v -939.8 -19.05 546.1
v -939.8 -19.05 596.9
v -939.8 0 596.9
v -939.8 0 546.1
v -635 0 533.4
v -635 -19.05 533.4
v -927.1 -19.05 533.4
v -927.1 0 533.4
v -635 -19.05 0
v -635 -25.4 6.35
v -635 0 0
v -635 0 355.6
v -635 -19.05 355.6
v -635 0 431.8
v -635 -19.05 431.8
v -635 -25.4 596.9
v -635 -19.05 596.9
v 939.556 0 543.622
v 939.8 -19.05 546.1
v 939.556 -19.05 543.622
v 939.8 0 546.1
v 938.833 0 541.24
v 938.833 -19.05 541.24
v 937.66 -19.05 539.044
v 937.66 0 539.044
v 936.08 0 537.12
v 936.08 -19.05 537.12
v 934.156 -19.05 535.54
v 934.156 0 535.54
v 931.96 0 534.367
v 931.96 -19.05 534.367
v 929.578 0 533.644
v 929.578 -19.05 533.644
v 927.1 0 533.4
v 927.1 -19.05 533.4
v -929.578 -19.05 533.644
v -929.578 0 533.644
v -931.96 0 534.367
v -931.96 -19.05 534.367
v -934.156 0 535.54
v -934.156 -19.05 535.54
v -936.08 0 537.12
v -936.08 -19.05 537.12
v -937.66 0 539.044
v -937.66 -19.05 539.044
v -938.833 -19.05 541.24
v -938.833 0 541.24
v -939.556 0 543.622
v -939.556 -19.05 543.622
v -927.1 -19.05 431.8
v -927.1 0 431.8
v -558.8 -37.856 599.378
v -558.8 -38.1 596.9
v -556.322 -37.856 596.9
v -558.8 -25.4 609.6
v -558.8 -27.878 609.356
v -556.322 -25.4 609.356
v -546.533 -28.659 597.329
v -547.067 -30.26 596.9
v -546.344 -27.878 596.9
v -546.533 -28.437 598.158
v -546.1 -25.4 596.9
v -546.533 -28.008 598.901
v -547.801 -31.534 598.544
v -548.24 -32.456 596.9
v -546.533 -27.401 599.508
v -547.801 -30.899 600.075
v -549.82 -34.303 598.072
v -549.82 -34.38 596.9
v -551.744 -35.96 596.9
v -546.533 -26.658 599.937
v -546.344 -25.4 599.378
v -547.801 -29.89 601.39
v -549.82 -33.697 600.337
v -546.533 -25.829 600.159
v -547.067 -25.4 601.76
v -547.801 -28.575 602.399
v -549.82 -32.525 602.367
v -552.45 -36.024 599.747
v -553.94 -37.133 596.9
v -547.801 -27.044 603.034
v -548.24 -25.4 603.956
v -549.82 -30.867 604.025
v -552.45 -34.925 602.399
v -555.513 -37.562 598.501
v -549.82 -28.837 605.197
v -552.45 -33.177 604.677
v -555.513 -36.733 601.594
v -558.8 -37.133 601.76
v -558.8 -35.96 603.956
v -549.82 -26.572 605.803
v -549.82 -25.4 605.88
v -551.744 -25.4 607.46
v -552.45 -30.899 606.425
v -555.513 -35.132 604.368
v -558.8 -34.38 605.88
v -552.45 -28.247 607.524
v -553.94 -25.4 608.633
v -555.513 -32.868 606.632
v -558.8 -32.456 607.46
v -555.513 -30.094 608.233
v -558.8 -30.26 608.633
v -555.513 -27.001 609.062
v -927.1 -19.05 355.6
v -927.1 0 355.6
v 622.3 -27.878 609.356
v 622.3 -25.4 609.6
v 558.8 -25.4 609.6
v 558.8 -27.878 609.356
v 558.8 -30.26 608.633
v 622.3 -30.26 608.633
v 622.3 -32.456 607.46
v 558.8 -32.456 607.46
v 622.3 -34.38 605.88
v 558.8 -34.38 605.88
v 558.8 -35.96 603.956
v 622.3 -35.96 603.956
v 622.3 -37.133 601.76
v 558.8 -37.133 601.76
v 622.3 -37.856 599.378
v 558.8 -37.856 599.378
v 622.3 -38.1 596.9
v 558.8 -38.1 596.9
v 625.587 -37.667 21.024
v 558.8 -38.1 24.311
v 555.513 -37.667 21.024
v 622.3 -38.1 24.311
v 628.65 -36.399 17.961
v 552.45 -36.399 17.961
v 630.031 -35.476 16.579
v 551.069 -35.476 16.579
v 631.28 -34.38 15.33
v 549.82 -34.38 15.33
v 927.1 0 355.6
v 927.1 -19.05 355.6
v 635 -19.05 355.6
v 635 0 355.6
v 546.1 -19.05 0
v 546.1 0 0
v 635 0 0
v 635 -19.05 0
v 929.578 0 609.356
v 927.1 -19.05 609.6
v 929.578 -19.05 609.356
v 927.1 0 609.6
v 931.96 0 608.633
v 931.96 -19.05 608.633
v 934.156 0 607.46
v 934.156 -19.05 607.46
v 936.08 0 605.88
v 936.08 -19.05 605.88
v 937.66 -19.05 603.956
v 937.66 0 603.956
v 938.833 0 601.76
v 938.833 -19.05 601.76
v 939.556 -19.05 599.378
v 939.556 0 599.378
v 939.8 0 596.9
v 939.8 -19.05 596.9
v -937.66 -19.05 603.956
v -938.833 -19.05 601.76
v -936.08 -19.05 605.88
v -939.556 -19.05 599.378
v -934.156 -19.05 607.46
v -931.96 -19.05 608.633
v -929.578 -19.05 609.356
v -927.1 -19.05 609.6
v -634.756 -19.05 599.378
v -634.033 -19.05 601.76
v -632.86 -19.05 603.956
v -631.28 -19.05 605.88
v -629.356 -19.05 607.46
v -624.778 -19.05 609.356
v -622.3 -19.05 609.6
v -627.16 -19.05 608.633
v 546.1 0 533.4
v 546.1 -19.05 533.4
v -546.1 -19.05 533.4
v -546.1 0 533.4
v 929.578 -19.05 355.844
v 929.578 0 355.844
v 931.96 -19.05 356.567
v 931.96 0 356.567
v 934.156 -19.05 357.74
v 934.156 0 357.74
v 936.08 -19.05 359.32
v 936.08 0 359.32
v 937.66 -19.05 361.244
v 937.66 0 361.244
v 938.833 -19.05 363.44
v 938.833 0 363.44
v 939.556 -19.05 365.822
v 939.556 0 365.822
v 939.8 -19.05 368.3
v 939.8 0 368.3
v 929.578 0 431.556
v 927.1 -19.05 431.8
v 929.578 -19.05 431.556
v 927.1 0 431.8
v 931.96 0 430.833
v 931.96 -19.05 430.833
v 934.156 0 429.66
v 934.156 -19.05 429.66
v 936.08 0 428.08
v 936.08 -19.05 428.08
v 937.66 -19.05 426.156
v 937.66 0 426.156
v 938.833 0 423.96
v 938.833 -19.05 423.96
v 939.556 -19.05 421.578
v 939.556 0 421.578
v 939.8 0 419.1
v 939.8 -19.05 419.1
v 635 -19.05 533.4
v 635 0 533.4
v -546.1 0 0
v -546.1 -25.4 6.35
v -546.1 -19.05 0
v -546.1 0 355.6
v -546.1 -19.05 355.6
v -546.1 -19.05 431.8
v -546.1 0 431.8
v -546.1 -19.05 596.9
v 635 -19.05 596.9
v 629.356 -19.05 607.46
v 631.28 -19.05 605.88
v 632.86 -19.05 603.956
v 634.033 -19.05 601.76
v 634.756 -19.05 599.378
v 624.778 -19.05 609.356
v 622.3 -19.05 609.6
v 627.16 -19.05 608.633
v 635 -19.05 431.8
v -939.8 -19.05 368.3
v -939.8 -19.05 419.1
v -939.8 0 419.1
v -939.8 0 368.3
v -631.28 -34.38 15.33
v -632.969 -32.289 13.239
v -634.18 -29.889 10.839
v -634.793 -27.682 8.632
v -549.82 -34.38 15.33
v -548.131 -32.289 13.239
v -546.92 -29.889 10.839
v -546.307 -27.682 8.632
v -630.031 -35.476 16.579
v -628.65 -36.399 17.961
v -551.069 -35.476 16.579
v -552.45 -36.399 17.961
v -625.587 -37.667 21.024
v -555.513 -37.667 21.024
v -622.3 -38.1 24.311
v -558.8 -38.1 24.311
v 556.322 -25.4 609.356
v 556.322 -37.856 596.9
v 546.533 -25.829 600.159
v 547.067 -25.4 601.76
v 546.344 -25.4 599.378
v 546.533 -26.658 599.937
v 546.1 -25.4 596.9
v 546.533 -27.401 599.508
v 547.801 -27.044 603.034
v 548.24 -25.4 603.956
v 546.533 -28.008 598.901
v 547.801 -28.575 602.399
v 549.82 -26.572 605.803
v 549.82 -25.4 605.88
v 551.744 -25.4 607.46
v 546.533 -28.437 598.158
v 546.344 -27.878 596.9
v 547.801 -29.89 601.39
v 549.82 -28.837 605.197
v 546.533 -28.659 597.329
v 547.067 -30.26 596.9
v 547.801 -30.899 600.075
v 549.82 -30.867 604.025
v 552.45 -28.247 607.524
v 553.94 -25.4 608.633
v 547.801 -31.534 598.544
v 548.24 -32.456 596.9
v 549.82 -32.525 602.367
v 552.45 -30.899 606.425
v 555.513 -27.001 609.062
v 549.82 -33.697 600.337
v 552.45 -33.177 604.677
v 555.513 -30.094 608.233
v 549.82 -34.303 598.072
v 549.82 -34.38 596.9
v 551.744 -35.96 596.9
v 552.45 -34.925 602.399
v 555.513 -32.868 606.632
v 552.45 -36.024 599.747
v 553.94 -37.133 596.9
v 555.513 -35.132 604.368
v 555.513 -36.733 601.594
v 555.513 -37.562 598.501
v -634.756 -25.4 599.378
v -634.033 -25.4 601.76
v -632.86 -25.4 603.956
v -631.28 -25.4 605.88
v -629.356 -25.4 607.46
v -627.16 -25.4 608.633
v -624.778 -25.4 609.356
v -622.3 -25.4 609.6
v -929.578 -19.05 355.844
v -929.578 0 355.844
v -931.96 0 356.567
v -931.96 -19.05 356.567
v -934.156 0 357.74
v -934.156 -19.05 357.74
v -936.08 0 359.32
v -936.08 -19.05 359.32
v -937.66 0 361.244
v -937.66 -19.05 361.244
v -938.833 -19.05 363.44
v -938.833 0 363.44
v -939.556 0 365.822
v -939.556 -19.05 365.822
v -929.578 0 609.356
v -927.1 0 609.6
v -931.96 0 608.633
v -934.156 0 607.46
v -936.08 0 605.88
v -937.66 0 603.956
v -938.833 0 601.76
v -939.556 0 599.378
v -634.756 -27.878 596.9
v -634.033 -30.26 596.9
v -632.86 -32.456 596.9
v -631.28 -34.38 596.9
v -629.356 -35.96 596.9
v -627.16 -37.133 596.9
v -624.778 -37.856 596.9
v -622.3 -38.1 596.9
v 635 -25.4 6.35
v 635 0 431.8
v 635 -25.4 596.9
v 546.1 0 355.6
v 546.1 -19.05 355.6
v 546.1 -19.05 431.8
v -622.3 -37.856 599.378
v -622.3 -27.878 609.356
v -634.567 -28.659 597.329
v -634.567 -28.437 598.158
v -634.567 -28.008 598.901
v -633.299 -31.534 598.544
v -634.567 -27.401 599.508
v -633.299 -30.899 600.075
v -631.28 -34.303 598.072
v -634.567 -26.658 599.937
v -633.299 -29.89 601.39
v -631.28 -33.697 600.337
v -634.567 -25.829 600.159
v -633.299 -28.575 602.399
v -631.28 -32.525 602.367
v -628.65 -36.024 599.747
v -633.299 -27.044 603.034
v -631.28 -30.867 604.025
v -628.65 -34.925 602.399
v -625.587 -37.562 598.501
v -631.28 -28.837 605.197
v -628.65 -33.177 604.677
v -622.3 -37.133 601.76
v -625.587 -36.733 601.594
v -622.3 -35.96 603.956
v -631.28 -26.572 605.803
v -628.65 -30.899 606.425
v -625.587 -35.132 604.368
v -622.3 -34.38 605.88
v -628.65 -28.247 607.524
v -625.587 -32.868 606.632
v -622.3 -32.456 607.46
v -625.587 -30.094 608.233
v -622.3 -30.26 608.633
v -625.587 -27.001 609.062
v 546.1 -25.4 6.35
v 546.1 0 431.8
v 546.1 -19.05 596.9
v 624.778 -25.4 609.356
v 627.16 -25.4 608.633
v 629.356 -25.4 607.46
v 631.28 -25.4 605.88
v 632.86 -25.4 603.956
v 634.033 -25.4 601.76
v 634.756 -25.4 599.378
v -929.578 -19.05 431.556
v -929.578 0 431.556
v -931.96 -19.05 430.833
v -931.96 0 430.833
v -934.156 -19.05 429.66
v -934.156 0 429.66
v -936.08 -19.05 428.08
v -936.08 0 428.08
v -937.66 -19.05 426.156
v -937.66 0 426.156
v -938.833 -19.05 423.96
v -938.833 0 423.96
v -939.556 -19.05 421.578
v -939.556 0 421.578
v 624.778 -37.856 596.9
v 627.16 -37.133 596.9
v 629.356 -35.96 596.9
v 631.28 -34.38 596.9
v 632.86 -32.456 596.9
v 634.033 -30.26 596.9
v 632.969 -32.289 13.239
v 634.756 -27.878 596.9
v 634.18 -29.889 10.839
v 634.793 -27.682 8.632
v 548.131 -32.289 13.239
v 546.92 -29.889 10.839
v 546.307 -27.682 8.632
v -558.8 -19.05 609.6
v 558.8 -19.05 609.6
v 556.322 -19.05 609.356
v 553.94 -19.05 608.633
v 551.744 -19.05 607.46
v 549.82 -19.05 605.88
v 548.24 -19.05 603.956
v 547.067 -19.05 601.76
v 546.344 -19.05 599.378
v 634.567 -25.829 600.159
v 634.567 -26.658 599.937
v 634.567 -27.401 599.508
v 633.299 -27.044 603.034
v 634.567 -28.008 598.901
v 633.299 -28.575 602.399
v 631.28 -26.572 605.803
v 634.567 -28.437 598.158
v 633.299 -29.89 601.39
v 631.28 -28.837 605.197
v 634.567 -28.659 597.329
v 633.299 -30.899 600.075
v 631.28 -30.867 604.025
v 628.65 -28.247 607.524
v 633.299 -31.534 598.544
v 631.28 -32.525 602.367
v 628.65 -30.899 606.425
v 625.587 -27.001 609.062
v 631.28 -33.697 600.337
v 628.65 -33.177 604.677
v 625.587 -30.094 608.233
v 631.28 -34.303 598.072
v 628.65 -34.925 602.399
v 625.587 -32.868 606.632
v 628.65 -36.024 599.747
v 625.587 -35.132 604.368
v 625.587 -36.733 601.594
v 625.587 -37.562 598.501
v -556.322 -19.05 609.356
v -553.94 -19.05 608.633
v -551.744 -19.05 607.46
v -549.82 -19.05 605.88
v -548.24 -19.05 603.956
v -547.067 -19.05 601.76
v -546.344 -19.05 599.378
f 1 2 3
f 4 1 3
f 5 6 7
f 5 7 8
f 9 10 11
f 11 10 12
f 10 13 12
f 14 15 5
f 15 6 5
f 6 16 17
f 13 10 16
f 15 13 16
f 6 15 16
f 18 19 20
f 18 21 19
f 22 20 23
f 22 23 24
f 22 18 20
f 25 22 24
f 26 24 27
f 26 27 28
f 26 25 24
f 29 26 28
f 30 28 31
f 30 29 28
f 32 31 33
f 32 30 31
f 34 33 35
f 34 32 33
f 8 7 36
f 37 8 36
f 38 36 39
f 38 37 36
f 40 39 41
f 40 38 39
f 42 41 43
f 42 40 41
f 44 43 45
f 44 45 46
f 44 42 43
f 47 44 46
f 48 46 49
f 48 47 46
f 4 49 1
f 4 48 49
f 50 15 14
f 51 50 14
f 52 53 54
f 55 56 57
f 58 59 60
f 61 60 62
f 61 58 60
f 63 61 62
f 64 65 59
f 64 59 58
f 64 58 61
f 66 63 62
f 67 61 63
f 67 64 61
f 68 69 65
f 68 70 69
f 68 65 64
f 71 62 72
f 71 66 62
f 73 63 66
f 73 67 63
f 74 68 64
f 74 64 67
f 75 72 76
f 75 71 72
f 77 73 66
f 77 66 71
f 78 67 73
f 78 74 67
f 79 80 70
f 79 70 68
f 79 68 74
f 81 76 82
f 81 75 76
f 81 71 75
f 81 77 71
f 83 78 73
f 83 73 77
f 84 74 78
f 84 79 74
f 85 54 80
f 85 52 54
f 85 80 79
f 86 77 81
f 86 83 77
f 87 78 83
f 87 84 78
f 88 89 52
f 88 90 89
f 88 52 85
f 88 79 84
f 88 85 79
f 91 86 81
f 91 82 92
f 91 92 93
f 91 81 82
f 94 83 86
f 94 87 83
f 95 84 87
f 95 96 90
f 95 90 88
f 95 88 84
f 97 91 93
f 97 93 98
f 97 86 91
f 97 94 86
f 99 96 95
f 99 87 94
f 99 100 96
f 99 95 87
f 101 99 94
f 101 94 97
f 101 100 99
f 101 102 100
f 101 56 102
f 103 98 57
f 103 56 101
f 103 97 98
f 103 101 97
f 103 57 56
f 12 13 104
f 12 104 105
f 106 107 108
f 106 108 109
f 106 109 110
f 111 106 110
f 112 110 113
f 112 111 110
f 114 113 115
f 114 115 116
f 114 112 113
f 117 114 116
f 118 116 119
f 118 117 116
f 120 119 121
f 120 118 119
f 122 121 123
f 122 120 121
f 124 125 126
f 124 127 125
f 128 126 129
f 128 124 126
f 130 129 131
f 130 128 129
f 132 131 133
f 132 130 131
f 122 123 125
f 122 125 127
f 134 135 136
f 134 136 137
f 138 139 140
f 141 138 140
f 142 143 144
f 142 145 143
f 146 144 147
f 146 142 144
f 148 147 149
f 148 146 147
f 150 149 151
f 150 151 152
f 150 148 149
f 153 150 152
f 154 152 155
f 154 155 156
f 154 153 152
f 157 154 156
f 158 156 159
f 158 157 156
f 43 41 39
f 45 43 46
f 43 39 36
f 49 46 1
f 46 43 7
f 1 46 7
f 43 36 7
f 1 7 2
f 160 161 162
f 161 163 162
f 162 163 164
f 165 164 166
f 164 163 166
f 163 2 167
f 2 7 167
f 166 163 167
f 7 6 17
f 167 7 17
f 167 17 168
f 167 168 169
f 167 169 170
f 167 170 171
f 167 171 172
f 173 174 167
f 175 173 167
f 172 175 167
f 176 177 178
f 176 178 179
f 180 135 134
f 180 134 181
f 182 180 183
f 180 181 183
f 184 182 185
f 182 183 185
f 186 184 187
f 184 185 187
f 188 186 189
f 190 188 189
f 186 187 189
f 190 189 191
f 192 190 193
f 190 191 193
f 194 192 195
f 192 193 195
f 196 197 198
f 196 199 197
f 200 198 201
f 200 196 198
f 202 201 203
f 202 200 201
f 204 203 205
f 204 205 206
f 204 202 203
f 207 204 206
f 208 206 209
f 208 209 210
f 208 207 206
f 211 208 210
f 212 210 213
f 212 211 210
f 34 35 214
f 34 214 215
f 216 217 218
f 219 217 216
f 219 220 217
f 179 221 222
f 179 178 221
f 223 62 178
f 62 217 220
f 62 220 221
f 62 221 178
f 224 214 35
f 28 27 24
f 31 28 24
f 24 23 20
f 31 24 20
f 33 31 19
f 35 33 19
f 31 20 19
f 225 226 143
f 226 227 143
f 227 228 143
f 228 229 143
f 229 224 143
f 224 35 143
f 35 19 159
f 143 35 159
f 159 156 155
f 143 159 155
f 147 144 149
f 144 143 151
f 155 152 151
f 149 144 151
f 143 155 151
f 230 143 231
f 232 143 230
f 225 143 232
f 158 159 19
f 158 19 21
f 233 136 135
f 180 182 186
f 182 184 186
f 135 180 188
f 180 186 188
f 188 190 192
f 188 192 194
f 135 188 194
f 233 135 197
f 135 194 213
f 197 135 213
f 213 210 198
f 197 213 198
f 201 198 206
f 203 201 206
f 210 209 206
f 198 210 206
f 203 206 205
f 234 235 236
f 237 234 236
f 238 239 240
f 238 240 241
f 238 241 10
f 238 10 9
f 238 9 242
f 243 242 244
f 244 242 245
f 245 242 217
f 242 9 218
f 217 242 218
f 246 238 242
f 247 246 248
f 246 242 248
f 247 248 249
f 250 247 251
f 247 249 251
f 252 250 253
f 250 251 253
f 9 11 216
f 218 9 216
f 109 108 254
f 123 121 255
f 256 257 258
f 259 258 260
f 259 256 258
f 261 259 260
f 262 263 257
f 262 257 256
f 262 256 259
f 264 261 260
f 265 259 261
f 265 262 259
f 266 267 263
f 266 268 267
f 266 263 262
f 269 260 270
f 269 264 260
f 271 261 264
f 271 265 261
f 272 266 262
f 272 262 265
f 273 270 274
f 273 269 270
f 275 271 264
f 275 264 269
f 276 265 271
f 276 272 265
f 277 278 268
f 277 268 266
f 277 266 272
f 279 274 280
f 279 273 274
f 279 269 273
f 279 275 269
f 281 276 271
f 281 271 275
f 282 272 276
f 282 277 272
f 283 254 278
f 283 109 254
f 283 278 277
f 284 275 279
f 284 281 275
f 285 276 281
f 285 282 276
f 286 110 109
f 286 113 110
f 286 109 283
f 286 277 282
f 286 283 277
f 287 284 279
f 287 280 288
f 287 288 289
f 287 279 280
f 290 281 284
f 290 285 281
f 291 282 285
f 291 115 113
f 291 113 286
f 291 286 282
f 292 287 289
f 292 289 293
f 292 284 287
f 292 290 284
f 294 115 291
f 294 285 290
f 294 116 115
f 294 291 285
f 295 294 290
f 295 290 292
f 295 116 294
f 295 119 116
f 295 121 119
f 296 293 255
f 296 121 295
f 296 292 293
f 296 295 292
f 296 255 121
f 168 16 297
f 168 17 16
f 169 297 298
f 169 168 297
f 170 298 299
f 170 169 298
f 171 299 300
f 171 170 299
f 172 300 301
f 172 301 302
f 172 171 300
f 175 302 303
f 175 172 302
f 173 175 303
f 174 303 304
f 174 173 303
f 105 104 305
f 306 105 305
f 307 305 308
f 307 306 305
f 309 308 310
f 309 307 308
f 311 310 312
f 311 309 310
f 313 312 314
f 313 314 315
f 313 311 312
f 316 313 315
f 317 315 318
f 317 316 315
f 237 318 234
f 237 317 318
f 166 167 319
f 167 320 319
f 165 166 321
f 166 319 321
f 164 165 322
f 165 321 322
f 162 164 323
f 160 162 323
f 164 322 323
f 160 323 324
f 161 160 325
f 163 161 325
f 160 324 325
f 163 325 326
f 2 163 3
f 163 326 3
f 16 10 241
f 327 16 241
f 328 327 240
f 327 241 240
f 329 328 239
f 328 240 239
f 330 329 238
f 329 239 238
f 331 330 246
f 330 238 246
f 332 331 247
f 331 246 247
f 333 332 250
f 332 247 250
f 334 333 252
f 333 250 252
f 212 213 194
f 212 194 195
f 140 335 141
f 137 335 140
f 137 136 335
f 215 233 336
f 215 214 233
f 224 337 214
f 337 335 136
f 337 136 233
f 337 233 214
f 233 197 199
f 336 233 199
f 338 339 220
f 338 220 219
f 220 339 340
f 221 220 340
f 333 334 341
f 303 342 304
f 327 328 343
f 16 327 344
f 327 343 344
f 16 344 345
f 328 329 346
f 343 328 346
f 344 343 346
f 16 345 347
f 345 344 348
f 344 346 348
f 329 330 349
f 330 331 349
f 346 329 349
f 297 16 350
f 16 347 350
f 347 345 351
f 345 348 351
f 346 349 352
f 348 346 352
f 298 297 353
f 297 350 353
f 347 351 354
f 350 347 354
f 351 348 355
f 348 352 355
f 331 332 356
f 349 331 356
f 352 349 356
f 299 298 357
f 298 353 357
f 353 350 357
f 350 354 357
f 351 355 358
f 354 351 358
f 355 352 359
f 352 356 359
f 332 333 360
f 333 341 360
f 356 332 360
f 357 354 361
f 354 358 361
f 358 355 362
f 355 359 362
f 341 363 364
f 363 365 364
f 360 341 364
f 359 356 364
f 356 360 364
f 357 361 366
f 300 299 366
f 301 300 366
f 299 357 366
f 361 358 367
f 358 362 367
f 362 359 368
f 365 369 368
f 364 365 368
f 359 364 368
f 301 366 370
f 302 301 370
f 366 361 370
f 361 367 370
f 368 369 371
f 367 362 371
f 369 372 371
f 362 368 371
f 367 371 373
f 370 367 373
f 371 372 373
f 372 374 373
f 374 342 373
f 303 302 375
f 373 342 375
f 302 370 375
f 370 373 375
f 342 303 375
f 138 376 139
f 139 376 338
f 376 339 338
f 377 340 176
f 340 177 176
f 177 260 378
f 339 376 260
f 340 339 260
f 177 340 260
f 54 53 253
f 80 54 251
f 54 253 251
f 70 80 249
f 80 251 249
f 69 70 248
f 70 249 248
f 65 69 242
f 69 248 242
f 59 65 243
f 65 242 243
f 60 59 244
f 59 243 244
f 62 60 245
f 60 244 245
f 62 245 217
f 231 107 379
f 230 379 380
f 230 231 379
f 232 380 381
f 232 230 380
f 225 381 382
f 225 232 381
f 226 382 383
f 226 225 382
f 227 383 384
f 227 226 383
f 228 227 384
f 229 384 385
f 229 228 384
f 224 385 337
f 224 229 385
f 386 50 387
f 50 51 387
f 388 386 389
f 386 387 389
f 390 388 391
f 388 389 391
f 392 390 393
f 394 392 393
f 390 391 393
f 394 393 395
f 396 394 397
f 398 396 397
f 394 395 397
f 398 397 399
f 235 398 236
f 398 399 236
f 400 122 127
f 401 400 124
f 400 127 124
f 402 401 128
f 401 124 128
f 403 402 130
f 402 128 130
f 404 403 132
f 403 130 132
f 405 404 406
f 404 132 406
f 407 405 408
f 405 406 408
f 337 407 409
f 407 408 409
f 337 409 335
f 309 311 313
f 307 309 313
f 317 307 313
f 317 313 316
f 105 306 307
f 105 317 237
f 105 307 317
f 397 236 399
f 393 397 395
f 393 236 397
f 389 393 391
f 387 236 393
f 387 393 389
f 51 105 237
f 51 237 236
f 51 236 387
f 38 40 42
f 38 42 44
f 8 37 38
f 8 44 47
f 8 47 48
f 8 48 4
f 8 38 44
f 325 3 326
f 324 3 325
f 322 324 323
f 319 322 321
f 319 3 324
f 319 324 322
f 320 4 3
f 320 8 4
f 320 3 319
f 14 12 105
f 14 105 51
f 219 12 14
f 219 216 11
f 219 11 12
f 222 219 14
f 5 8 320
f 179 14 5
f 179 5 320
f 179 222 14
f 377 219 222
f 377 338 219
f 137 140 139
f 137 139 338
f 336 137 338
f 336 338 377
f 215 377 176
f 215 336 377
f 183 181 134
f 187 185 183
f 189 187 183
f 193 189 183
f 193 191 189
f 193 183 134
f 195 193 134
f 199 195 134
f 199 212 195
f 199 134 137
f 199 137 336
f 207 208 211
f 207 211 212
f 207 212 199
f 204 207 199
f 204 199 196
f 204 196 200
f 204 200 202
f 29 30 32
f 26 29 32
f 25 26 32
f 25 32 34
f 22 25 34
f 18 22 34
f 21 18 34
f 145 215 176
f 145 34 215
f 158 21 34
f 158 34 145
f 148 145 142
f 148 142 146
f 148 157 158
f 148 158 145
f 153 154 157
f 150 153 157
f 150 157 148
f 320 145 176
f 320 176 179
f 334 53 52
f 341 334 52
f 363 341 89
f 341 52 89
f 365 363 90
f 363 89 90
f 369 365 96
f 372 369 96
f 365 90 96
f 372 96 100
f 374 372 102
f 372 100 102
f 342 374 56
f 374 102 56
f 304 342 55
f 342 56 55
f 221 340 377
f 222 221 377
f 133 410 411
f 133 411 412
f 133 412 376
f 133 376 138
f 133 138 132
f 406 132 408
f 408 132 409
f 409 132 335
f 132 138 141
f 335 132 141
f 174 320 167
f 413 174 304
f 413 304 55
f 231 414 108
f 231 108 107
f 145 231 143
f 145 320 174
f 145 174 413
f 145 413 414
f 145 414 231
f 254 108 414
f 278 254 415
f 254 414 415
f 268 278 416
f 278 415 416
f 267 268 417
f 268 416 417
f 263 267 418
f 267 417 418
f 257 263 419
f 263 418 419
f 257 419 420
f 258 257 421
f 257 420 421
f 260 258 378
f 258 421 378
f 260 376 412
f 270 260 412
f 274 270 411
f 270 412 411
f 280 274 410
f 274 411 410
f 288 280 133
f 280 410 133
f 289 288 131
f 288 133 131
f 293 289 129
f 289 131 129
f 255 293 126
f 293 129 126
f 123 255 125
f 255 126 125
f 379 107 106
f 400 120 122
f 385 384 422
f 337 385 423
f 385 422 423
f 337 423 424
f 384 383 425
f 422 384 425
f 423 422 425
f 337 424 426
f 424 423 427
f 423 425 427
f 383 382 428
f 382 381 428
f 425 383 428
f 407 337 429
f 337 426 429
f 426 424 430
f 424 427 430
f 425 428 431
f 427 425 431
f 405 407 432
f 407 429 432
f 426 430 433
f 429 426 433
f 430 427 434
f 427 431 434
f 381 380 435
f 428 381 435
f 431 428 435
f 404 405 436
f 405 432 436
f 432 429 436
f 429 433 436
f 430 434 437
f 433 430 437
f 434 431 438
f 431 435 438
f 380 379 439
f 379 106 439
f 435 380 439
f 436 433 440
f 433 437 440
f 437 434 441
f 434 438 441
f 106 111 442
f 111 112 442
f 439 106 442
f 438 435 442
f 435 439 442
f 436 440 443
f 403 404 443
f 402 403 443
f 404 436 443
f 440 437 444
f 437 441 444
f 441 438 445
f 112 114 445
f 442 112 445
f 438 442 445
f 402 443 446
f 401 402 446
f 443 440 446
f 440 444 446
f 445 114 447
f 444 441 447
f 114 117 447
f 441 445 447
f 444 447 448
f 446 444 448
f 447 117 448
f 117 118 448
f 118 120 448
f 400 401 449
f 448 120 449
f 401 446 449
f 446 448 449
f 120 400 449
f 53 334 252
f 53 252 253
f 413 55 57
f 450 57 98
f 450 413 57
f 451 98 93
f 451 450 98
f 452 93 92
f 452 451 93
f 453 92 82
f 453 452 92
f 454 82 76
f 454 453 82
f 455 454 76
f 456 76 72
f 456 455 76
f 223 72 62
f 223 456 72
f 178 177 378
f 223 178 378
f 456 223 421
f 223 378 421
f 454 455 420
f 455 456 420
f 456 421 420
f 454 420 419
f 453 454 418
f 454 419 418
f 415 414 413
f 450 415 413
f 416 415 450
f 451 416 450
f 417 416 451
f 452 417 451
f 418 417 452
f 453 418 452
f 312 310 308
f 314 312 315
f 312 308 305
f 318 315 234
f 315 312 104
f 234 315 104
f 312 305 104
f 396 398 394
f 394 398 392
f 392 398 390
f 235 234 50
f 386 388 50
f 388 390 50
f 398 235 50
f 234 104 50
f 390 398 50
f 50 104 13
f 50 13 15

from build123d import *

# Parameters (mm, degrees)
F0_W     = 19.05
F0_H     = 76.2
F1_DEPTH = 939.8
F2_W     = 88.9
F2_H     = 38.1
F3_DEPTH = 609.6
F4_SIZE  = 19.05
F5_W     = 19.05
F5_H     = 76.2
F6_DEPTH = 939.8
F7_R     = 12.7


with BuildPart() as f1:
    # F0 (on Right) → F1 (new body, symmetric)
    with BuildSketch(Plane.YZ):
        with Locations((-9.525, 571.5)):
            Rectangle(F0_W, F0_H)
    extrude(amount=F1_DEPTH, both=True)

    # F2 (on face) → F3 (join, through all)
    with BuildSketch(Plane.XY.offset(609.6)):
        with Locations((590.55, -19.05)):
            Rectangle(F2_W, F2_H)
        with Locations((-590.55, -19.05)):
            Rectangle(F2_W, F2_H)
    extrude(amount=-F3_DEPTH)

    # F4
    f4_edges = [f1.edges().sort_by_distance(p)[0] for p in [
        (590.55, -38.1, 0),
        (-590.55, -38.1, 0),
    ]]
    chamfer(f4_edges, length=F4_SIZE)

    # F5 (on Right) → F6 (join, symmetric)
    with BuildSketch(Plane.YZ):
        with Locations((-9.525, 393.7)):
            Rectangle(F5_W, F5_H)
    extrude(amount=F6_DEPTH, both=True)

    # F7
    f7_edges = [f1.edges().sort_by_distance(p)[0] for p in [
        (939.8, -9.525, 609.6),
        (939.8, -9.525, 533.4),
        (590.55, -38.1, 609.6),
        (635, -28.575, 609.6),
        (546.1, -28.575, 609.6),
        (635, -38.1, 314.325),
        (546.1, -38.1, 314.325),
        (-590.55, -38.1, 609.6),
        (-546.1, -38.1, 314.325),
        (-635, -38.1, 314.325),
        (-635, -28.575, 609.6),
        (-939.8, -9.525, 609.6),
        (-939.8, -9.525, 533.4),
        (-546.1, -28.575, 609.6),
        (-590.55, -38.1, 19.05),
        (590.55, -38.1, 19.05),
        (939.8, -9.525, 431.8),
        (939.8, -9.525, 355.6),
        (-939.8, -9.525, 431.8),
        (-939.8, -9.525, 355.6),
    ]]
    fillet(f7_edges, radius=F7_R)


solid = f1.part
